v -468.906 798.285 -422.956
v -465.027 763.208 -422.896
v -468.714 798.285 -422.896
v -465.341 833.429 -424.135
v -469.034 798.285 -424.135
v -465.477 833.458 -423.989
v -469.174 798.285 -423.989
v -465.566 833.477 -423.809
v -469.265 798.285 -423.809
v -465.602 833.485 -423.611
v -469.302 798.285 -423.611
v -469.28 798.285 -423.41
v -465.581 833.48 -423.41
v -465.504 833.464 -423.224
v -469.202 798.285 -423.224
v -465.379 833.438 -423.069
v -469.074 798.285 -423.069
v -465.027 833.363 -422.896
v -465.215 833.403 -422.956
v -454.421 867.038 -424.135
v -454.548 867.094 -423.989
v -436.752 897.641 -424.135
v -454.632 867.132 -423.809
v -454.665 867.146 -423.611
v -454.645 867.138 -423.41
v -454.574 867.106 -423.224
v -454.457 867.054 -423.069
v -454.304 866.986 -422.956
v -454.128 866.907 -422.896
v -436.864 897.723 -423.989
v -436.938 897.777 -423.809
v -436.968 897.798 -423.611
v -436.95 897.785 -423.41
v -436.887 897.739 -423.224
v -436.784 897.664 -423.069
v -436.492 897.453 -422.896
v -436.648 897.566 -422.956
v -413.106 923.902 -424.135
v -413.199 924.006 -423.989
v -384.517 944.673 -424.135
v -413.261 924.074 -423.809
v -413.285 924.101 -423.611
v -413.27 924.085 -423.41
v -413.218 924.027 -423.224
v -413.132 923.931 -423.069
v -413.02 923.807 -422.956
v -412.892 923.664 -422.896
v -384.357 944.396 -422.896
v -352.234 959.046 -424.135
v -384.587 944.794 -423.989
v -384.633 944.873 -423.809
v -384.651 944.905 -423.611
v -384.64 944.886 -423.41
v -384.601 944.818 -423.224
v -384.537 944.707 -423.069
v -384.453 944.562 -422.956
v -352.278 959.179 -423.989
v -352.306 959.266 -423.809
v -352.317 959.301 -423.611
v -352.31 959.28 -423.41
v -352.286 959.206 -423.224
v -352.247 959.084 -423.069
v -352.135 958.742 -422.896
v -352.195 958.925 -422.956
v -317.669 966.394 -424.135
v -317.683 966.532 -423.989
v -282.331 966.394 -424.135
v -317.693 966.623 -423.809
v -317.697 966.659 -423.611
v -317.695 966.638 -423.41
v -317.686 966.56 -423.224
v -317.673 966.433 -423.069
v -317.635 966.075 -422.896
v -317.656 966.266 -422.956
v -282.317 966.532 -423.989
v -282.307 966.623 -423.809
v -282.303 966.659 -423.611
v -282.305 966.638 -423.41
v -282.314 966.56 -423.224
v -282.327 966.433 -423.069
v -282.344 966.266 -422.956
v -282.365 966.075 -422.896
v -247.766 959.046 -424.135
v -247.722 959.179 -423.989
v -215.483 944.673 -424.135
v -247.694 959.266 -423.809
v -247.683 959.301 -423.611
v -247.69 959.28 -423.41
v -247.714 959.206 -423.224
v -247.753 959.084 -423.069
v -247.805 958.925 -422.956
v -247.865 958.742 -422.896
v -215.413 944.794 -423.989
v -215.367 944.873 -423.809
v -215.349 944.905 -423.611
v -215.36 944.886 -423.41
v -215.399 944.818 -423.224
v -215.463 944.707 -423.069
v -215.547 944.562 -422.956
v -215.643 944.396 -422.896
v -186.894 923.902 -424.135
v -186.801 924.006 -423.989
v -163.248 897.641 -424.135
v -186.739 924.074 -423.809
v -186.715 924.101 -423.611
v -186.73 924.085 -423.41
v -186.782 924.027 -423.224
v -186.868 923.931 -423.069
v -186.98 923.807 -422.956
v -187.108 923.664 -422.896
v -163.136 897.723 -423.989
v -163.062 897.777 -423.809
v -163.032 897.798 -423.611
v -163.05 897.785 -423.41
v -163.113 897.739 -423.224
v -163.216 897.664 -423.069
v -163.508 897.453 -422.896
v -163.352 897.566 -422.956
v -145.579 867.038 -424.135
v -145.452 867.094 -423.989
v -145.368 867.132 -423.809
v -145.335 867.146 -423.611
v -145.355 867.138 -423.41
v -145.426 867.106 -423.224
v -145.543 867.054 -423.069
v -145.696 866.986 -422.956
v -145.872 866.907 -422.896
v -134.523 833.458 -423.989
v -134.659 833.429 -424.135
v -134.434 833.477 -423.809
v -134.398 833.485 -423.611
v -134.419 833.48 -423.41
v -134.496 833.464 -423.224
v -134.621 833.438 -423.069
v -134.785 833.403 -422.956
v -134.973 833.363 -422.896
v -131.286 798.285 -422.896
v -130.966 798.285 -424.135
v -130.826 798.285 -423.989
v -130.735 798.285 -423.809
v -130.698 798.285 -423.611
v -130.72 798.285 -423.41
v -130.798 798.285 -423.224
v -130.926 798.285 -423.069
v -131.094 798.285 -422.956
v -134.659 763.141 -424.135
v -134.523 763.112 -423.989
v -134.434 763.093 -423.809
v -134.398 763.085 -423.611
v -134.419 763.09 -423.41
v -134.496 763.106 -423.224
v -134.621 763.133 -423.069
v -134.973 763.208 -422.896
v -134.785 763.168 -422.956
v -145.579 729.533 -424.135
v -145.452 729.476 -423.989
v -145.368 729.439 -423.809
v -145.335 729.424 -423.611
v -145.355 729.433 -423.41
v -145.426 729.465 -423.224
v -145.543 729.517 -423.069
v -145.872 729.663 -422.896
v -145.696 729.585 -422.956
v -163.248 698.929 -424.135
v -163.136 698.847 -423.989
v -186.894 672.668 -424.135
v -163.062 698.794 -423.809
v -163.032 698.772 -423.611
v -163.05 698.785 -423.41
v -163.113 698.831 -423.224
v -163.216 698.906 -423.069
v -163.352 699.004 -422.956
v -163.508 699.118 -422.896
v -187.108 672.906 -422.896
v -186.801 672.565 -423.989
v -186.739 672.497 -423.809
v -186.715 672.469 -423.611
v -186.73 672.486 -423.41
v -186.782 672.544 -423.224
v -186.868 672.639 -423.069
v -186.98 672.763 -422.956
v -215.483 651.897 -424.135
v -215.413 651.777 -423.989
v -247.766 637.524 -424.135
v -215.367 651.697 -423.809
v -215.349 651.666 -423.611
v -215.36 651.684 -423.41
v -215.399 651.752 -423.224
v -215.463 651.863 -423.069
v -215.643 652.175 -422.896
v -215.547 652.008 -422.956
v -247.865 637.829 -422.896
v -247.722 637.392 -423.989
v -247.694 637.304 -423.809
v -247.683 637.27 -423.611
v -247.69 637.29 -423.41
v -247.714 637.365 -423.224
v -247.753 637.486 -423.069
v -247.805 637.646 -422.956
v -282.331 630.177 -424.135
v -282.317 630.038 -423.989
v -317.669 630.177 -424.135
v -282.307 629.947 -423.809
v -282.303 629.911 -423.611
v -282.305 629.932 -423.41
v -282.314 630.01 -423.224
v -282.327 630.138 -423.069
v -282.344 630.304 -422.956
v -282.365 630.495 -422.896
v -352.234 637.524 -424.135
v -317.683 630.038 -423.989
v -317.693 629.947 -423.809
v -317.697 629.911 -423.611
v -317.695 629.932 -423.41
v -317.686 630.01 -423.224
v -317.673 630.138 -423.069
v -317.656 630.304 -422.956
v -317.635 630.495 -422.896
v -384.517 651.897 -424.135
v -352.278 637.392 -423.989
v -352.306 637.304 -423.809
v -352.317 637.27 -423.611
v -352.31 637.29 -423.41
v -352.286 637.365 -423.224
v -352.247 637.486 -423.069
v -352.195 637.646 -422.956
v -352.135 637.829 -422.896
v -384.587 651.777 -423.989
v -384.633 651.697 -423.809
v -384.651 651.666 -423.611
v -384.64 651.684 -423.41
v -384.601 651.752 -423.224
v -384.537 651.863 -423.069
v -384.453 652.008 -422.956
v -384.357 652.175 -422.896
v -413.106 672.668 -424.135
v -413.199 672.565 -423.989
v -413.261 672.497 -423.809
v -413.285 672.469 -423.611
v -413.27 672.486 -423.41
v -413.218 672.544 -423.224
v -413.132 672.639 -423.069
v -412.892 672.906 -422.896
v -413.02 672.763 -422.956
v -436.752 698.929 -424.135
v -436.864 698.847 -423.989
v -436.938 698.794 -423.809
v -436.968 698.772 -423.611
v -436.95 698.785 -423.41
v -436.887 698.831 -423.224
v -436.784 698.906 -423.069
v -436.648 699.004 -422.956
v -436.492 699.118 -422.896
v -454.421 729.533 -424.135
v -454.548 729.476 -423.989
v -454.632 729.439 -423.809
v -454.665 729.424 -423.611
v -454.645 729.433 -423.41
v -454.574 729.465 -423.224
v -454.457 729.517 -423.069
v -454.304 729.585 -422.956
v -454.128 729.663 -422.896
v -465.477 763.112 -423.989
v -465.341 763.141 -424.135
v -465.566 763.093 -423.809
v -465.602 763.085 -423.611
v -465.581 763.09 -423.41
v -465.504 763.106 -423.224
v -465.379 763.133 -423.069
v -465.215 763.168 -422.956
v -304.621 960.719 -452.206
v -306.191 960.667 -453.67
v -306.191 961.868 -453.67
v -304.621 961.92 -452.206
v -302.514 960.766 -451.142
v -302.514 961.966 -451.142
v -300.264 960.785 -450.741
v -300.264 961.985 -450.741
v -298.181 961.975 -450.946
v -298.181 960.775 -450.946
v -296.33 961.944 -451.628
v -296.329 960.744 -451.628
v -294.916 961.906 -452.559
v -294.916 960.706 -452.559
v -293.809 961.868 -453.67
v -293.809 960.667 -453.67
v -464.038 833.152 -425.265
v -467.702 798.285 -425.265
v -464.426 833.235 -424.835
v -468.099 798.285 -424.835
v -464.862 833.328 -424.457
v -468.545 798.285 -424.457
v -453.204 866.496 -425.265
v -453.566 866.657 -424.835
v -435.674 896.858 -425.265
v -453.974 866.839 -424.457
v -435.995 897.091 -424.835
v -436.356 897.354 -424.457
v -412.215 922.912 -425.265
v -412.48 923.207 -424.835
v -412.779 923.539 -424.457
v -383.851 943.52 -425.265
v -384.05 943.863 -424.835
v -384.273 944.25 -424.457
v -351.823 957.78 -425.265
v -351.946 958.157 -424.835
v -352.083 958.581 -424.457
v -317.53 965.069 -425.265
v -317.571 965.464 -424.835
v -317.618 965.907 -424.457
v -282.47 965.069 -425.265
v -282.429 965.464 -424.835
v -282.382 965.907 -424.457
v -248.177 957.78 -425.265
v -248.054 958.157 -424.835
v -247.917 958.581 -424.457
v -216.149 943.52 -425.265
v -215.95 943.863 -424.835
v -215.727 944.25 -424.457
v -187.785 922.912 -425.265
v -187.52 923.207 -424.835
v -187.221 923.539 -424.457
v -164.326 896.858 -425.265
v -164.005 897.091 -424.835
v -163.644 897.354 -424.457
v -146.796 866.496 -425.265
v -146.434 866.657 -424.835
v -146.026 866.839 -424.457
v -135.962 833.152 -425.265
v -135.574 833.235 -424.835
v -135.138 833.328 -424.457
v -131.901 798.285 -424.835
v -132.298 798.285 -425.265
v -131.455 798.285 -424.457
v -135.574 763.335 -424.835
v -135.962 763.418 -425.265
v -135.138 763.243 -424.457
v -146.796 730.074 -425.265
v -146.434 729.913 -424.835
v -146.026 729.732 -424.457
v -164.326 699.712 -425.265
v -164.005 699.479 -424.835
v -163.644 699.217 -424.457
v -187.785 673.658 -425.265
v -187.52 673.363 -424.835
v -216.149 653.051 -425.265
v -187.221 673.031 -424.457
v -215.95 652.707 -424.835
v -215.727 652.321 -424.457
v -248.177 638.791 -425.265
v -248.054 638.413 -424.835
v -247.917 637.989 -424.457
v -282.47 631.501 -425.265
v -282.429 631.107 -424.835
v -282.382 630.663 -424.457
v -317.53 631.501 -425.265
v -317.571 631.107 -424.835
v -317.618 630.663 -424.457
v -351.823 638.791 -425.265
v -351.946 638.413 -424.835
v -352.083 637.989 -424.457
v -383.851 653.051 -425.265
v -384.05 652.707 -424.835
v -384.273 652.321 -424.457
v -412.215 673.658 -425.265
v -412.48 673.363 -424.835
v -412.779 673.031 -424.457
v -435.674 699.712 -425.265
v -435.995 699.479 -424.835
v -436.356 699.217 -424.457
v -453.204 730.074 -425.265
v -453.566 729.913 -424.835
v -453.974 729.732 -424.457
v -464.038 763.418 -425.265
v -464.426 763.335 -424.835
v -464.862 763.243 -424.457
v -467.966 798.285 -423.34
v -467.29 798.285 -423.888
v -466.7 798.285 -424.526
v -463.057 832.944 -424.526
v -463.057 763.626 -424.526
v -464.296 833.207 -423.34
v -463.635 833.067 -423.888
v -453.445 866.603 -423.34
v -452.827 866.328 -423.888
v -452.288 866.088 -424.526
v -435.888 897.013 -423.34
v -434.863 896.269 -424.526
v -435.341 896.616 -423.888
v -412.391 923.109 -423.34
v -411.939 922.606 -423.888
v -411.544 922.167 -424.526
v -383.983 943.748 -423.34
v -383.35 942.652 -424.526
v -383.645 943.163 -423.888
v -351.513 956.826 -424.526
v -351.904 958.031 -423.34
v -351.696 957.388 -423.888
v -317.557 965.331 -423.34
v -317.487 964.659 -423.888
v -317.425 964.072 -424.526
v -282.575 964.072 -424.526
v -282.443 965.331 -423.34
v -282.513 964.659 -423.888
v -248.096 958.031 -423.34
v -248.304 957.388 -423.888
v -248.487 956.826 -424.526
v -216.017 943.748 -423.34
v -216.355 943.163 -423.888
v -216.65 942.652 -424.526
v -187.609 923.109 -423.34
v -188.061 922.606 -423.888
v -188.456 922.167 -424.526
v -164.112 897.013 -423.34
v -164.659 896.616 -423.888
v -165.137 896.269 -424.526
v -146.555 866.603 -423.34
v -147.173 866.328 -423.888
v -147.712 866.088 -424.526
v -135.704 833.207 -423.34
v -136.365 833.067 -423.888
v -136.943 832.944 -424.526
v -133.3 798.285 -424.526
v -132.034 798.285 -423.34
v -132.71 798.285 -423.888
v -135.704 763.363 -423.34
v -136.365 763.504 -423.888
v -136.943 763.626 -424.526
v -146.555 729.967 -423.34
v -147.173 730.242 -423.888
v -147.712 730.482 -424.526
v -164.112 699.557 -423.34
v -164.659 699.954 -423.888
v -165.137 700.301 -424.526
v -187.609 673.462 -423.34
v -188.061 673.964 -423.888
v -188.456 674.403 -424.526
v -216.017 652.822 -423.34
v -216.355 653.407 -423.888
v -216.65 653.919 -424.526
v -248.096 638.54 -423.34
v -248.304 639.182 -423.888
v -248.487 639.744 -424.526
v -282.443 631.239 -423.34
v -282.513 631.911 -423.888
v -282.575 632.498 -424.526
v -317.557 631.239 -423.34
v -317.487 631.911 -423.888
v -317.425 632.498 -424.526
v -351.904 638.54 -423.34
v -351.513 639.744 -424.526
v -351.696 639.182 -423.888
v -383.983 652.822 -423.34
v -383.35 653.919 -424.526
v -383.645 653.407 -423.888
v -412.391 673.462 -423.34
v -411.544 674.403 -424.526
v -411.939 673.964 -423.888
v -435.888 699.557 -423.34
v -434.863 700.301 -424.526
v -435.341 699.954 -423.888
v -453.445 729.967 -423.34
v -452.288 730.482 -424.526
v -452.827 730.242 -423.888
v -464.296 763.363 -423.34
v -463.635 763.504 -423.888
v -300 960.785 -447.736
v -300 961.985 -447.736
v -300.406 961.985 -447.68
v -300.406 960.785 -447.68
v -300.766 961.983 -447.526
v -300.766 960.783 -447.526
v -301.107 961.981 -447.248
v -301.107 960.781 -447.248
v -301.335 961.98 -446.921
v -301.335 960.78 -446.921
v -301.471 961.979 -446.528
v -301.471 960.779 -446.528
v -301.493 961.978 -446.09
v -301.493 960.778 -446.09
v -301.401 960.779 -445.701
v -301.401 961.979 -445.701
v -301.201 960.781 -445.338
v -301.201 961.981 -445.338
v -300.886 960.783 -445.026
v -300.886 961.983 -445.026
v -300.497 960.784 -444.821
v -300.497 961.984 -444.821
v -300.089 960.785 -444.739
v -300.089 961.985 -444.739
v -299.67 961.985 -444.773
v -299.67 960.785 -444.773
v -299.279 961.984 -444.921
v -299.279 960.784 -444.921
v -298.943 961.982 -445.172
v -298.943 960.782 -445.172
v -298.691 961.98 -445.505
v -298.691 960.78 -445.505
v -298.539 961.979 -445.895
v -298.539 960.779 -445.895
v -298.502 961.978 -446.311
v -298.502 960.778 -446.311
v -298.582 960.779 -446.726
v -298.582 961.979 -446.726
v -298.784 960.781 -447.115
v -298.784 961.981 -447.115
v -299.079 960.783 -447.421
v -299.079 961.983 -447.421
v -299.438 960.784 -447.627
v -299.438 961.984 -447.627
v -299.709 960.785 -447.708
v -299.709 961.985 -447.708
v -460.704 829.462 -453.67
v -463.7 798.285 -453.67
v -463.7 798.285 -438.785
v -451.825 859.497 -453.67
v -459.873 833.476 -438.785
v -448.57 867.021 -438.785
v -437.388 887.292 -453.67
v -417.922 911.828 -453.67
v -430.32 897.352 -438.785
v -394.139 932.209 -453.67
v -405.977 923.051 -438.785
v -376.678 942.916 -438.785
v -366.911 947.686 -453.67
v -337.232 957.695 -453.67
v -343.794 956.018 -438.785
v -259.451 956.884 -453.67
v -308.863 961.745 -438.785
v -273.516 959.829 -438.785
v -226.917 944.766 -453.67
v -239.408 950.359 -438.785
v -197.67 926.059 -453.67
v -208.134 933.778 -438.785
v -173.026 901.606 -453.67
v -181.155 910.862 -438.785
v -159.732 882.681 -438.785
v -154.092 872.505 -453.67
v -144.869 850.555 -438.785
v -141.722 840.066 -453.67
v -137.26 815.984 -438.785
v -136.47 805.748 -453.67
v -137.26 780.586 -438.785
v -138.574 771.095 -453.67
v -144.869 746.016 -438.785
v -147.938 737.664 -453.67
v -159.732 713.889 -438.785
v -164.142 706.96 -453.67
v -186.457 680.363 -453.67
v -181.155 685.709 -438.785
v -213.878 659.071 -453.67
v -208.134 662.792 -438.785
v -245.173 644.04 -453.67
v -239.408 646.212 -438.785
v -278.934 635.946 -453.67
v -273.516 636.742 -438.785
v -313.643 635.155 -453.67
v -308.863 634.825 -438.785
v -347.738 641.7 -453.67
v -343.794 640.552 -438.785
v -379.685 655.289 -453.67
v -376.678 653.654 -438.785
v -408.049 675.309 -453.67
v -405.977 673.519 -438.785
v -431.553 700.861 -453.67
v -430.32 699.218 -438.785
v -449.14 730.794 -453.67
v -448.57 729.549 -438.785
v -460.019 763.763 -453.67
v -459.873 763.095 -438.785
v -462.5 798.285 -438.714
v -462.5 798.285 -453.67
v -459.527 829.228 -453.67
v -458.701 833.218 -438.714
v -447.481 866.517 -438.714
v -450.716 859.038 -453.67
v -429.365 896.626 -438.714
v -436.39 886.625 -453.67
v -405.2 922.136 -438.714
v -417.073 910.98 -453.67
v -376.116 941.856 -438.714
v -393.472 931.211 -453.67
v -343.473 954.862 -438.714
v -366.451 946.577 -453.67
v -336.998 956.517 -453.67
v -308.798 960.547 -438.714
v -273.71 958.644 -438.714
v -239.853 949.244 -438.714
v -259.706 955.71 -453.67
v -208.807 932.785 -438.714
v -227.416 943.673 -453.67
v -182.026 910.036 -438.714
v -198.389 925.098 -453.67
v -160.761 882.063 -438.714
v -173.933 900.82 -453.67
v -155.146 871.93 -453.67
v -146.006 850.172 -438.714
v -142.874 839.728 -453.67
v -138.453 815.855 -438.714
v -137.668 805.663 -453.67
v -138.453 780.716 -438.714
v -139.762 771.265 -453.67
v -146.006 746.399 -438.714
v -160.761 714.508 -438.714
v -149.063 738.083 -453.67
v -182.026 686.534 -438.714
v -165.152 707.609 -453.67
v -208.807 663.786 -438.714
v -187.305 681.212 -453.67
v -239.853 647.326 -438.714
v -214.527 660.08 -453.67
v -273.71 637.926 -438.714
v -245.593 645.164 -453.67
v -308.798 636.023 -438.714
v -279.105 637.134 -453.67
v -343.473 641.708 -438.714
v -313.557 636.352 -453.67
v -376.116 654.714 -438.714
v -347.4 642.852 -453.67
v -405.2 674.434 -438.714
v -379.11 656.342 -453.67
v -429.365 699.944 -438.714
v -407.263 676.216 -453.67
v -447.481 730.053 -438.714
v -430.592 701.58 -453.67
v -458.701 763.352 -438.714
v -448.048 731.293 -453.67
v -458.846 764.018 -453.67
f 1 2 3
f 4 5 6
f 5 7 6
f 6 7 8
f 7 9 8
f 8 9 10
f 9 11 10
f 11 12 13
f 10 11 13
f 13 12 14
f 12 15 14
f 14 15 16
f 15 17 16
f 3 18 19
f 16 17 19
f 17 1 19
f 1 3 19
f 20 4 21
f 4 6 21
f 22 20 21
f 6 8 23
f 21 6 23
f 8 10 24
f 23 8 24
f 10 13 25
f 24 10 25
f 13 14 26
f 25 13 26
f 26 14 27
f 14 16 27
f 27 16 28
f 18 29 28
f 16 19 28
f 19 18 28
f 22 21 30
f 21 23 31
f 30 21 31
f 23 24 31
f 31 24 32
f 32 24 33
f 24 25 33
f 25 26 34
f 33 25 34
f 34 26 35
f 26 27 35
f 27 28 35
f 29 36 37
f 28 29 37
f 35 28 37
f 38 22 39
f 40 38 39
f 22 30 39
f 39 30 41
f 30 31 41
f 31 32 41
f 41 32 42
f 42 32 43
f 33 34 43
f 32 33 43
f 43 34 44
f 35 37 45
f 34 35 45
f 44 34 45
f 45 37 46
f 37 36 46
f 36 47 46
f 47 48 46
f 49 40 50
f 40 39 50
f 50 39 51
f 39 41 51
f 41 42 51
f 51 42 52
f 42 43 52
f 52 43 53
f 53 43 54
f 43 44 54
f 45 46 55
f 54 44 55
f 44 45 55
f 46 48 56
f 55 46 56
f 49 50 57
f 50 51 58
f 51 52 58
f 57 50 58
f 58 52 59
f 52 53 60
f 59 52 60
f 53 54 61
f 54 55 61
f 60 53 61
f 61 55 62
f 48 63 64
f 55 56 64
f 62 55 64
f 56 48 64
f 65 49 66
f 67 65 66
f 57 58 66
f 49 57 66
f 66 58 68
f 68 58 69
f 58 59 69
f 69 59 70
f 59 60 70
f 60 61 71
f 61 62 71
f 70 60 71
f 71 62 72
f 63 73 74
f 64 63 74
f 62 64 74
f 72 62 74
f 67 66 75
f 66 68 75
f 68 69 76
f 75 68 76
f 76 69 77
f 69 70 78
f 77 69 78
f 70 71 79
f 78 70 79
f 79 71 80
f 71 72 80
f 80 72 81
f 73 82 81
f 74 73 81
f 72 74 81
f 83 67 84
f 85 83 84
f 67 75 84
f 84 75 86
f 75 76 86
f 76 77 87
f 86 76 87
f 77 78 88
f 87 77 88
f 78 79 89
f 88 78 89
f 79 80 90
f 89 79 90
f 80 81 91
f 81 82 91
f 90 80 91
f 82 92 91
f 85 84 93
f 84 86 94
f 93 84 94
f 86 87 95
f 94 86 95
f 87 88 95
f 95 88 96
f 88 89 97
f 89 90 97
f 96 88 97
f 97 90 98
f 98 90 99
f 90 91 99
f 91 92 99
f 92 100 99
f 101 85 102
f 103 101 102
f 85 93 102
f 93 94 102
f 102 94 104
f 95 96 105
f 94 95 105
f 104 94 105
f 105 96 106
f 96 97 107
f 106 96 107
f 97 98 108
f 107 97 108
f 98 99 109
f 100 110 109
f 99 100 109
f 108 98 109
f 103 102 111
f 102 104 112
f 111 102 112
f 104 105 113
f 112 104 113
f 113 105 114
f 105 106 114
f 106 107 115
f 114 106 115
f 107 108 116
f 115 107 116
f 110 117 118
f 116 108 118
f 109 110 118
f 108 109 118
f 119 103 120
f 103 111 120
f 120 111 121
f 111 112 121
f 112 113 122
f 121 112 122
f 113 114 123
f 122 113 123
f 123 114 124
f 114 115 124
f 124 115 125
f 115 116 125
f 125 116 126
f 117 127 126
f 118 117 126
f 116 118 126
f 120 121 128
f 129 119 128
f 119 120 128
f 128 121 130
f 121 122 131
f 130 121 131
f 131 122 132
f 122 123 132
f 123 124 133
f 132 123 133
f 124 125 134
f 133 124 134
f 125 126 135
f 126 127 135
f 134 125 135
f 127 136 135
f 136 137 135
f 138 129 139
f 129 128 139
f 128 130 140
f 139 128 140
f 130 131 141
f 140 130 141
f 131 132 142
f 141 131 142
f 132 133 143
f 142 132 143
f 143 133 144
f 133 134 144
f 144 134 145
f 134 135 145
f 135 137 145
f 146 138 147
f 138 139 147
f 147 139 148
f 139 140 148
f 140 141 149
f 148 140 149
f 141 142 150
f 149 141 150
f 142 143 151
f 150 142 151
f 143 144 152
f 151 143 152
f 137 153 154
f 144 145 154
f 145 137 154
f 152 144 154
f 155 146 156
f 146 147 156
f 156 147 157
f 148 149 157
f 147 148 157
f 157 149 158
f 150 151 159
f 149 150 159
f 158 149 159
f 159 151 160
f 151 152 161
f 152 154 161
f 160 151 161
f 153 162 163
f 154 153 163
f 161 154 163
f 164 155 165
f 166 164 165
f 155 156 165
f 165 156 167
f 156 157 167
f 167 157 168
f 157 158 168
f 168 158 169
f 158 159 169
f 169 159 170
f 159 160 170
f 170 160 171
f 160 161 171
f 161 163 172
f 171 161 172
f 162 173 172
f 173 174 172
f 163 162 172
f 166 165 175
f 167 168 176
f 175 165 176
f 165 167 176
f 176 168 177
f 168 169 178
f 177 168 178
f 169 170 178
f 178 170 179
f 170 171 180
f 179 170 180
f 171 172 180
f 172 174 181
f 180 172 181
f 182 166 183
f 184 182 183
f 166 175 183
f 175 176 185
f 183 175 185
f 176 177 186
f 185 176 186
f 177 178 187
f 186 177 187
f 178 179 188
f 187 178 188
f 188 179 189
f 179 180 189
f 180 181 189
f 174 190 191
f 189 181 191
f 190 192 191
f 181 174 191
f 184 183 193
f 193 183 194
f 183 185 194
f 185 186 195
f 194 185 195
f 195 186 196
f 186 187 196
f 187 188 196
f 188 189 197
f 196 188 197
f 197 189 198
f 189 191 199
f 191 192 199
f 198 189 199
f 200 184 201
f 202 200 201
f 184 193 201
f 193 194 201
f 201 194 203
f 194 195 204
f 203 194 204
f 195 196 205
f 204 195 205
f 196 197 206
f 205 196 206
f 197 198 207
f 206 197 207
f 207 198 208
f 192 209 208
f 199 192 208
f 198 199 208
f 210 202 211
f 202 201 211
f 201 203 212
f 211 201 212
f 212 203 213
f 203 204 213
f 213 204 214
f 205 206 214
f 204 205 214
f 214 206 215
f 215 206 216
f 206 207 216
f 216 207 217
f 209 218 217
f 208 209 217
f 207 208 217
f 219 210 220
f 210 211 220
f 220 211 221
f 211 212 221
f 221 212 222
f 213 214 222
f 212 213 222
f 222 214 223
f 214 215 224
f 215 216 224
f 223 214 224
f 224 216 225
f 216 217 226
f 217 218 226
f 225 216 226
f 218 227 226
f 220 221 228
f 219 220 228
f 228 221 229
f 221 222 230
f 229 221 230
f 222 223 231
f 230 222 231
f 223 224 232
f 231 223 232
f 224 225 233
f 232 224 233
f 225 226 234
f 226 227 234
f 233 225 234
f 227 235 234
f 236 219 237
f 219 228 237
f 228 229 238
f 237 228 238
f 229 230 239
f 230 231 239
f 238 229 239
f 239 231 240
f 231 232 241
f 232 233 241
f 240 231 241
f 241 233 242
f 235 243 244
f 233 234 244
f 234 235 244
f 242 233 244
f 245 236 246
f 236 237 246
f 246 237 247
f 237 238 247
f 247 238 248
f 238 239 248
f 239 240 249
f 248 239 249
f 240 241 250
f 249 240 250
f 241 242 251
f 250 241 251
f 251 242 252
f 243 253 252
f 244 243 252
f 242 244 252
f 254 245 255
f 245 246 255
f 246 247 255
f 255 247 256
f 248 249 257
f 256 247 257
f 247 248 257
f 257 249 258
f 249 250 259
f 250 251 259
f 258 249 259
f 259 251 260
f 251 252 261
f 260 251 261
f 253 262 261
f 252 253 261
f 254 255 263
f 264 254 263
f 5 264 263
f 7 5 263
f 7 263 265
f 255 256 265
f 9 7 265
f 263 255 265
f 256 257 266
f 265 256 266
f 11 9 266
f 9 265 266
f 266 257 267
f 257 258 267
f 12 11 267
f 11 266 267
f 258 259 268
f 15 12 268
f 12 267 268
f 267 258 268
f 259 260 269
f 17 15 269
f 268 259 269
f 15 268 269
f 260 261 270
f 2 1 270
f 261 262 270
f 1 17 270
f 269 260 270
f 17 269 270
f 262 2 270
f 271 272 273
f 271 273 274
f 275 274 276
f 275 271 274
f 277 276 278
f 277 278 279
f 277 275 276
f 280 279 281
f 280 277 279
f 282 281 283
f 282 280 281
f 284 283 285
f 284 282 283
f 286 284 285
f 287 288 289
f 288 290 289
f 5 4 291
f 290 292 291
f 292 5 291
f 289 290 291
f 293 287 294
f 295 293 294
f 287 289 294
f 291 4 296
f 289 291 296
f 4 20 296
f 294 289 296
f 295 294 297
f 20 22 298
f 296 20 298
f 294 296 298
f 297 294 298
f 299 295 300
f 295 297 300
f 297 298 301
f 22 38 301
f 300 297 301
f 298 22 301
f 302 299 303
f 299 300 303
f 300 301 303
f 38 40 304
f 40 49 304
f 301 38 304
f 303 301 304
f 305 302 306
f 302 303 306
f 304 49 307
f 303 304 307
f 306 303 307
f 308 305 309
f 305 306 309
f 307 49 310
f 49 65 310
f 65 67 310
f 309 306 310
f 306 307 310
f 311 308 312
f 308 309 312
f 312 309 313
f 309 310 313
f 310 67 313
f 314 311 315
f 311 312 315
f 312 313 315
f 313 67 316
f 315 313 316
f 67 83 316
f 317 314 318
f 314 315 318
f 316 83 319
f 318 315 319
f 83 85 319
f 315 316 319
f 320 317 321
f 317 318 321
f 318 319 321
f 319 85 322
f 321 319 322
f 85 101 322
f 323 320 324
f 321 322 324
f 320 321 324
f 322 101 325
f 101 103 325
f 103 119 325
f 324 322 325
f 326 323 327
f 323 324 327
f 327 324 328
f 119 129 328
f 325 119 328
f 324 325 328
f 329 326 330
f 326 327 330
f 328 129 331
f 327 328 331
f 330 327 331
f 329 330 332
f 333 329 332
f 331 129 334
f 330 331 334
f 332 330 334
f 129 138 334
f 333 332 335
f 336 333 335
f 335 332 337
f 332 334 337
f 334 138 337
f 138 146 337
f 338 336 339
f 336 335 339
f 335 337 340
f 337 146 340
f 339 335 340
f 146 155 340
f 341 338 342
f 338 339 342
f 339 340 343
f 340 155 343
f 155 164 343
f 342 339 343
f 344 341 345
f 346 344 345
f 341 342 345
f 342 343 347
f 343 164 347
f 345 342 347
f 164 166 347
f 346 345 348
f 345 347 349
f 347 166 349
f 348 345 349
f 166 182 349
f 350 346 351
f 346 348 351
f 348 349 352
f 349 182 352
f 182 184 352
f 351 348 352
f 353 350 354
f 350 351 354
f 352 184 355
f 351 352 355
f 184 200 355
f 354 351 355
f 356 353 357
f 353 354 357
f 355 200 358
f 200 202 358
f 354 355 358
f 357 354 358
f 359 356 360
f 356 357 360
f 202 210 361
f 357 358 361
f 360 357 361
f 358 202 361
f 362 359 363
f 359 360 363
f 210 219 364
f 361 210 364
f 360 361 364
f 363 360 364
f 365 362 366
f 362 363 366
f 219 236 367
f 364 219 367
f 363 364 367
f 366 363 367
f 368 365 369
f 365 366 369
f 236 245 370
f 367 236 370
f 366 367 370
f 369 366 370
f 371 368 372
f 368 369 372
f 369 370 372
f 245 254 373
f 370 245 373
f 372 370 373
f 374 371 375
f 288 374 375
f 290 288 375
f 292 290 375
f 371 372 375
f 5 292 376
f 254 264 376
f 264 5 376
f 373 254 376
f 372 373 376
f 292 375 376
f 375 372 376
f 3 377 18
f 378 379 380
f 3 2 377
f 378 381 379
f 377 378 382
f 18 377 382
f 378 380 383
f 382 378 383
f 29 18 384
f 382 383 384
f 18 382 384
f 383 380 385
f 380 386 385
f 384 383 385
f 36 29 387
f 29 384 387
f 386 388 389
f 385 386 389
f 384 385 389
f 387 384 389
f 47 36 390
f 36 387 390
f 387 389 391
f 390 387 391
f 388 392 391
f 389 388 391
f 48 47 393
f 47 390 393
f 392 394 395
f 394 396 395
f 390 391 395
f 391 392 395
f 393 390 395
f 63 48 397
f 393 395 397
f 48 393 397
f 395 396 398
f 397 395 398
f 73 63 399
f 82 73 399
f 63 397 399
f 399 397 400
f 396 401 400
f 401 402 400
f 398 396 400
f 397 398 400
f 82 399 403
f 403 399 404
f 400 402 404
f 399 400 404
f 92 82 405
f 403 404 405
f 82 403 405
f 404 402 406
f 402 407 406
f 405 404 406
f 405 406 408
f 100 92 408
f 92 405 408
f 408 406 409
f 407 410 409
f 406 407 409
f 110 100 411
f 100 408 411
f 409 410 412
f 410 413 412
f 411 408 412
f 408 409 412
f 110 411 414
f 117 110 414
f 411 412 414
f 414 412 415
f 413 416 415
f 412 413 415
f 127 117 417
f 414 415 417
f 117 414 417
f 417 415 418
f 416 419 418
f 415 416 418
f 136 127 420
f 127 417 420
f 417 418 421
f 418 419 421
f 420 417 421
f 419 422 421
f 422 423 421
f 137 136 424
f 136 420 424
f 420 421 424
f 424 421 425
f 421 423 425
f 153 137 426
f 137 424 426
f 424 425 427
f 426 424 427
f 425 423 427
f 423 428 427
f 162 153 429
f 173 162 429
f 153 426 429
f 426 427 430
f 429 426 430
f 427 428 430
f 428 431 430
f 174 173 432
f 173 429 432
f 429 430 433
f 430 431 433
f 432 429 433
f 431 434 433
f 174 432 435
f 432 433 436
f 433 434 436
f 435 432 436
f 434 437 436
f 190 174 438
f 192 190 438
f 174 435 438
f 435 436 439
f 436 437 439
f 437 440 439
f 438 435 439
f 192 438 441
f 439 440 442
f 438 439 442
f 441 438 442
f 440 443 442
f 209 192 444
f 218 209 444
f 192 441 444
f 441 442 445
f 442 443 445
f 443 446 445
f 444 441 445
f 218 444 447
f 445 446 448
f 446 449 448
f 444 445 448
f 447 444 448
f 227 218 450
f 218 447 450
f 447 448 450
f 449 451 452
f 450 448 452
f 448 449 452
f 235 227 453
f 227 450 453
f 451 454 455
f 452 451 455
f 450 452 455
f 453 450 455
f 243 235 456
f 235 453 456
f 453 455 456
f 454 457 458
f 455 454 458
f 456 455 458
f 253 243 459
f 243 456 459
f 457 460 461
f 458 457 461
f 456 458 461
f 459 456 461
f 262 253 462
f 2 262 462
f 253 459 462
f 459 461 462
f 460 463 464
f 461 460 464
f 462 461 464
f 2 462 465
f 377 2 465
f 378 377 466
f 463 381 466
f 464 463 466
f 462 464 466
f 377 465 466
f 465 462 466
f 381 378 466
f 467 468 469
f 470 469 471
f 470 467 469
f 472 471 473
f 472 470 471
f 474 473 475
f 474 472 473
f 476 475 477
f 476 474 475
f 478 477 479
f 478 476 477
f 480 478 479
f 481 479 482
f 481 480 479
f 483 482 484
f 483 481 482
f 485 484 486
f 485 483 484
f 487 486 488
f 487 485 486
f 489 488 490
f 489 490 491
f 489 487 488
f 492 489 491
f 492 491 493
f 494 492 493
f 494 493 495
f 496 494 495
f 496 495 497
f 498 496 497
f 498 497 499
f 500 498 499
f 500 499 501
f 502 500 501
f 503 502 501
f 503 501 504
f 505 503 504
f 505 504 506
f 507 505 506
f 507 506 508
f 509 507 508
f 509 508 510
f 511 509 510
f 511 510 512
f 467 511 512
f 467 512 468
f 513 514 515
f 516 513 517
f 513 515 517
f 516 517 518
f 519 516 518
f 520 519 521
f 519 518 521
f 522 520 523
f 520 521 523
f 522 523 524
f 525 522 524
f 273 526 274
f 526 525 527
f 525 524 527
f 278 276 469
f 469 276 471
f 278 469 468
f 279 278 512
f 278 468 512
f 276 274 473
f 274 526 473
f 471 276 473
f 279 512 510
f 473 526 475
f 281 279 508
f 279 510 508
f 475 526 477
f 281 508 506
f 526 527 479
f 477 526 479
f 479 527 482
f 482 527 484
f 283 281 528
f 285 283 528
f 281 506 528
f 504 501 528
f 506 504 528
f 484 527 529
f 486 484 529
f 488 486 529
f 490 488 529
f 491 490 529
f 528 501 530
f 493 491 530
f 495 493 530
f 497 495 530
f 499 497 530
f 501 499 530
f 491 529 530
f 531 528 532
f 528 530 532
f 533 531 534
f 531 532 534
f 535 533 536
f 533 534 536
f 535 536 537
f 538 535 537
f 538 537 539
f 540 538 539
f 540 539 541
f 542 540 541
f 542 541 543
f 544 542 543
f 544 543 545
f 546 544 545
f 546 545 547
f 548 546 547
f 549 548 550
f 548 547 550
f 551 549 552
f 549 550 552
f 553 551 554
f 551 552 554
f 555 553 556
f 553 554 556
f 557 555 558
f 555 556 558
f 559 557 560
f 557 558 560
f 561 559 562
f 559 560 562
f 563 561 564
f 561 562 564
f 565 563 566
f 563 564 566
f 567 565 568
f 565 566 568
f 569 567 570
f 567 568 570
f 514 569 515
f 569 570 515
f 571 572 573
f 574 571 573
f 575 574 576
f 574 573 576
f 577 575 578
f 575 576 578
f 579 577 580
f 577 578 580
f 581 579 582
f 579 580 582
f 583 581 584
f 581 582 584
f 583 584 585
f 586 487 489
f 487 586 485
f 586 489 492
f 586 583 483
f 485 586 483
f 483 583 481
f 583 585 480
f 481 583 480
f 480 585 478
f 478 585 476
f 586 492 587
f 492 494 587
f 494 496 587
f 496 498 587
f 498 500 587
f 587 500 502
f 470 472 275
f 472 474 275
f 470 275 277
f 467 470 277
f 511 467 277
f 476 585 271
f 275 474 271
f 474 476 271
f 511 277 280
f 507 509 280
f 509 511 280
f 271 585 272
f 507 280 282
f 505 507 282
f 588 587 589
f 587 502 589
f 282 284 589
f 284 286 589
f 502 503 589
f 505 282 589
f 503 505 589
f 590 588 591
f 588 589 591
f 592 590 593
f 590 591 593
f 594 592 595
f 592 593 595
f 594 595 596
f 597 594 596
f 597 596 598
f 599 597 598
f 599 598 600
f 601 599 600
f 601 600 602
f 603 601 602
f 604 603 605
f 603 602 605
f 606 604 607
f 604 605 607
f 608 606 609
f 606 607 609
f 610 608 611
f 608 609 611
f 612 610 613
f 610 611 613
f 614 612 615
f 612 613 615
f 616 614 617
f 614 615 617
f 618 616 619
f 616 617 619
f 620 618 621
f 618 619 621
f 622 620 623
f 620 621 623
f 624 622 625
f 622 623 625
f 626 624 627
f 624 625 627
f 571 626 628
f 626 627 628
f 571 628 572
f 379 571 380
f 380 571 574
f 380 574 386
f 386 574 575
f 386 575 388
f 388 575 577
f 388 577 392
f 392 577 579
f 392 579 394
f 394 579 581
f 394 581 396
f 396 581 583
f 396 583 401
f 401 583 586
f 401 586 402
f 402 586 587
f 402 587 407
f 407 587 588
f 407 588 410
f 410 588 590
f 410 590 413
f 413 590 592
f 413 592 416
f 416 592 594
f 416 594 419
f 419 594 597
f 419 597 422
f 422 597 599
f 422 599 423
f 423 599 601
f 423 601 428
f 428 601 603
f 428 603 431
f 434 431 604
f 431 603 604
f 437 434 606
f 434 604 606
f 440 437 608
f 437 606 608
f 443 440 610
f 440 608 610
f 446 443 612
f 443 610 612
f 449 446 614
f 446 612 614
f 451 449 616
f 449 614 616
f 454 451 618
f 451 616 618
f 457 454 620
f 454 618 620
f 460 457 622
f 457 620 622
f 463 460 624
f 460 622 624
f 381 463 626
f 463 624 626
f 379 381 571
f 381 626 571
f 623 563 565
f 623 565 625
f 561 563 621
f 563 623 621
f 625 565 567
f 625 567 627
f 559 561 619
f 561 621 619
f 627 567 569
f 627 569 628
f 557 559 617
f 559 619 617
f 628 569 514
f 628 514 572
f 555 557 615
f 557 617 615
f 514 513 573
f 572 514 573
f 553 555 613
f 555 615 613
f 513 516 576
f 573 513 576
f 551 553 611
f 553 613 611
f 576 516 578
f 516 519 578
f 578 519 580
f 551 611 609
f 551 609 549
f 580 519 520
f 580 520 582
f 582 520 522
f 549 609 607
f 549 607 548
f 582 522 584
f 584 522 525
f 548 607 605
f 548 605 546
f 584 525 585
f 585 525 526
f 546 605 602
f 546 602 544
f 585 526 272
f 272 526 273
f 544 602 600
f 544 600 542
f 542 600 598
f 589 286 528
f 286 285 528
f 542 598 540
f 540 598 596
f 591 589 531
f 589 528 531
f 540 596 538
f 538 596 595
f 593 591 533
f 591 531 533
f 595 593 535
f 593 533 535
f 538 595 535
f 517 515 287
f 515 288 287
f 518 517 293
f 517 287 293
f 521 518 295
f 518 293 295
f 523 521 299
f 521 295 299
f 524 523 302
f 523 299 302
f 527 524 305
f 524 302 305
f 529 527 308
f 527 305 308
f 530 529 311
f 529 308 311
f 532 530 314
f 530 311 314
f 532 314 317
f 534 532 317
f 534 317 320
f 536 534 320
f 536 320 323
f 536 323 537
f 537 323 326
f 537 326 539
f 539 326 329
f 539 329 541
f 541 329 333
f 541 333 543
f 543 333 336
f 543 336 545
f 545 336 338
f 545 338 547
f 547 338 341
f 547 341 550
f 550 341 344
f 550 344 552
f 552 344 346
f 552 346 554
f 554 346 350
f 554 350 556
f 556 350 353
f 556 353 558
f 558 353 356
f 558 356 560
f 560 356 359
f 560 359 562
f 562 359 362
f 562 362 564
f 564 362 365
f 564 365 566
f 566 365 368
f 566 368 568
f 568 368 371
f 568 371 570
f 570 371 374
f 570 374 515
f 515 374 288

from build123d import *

# Parameters (mm, degrees)
SKETCH8_R          = 1.5
CUT_EXTRUDE1_DEPTH = 675.332492822


with BuildPart() as part:
    # Sketch1 → Revolve1 (revolve)
    with BuildSketch(Plane(origin=(-300, 0, 0), x_dir=(0, -1, 0), z_dir=(-1, 0, 0)), mode=Mode.PRIVATE) as revolve1_sk:
        with BuildLine():
            Line((-631.585161389, -424.526276491), (-635.785161389, -438.713521565))
            Line((-635.785161389, -438.713521565), (-635.785161389, -453.670006409))
            Line((-635.785161389, -453.670006409), (-634.585161389, -453.670006409))
            Line((-634.585161389, -453.670006409), (-634.585161389, -438.785397411))
            Line((-634.585161389, -438.785397411), (-630.582706756, -425.265443891))
            ThreePointArc((-630.582706756, -425.265443891), (-629.96855649, -424.639289663), (-629.250787995, -424.135247944))
            ThreePointArc((-629.250787995, -424.135247944), (-629.005156259, -423.410467755), (-629.571265705, -422.895529538))
            ThreePointArc((-629.571265705, -422.895529538), (-630.666584798, -423.601768681), (-631.585161389, -424.526276491))
        make_face()
    revolve(revolve1_sk.sketch.rotate(Axis((-300, 798.285161389, -417.264314325), (0, 0, -1)), 90), axis=Axis((-300, 798.285161389, -417.264314325), (0, 0, -1)))

    # Sketch8 → Cut-Extrude1 (cut, through all)
    with BuildSketch(Plane(origin=(0, 798.285161389, 0), x_dir=(1, 0, 0), z_dir=(0, 1, 0))):
        with Locations(Location((-300, 446.236353344, 0), (0, 0, 90))):
            Circle(SKETCH8_R)
        with BuildLine():
            Line((-293.808705408, 453.670006409), (-306.191294592, 453.670006409))
            ThreePointArc((-306.191294592, 453.670006409), (-300, 450.736353344), (-293.808705408, 453.670006409))
        make_face()
    extrude(amount=CUT_EXTRUDE1_DEPTH, mode=Mode.SUBTRACT)


solid = part.part
